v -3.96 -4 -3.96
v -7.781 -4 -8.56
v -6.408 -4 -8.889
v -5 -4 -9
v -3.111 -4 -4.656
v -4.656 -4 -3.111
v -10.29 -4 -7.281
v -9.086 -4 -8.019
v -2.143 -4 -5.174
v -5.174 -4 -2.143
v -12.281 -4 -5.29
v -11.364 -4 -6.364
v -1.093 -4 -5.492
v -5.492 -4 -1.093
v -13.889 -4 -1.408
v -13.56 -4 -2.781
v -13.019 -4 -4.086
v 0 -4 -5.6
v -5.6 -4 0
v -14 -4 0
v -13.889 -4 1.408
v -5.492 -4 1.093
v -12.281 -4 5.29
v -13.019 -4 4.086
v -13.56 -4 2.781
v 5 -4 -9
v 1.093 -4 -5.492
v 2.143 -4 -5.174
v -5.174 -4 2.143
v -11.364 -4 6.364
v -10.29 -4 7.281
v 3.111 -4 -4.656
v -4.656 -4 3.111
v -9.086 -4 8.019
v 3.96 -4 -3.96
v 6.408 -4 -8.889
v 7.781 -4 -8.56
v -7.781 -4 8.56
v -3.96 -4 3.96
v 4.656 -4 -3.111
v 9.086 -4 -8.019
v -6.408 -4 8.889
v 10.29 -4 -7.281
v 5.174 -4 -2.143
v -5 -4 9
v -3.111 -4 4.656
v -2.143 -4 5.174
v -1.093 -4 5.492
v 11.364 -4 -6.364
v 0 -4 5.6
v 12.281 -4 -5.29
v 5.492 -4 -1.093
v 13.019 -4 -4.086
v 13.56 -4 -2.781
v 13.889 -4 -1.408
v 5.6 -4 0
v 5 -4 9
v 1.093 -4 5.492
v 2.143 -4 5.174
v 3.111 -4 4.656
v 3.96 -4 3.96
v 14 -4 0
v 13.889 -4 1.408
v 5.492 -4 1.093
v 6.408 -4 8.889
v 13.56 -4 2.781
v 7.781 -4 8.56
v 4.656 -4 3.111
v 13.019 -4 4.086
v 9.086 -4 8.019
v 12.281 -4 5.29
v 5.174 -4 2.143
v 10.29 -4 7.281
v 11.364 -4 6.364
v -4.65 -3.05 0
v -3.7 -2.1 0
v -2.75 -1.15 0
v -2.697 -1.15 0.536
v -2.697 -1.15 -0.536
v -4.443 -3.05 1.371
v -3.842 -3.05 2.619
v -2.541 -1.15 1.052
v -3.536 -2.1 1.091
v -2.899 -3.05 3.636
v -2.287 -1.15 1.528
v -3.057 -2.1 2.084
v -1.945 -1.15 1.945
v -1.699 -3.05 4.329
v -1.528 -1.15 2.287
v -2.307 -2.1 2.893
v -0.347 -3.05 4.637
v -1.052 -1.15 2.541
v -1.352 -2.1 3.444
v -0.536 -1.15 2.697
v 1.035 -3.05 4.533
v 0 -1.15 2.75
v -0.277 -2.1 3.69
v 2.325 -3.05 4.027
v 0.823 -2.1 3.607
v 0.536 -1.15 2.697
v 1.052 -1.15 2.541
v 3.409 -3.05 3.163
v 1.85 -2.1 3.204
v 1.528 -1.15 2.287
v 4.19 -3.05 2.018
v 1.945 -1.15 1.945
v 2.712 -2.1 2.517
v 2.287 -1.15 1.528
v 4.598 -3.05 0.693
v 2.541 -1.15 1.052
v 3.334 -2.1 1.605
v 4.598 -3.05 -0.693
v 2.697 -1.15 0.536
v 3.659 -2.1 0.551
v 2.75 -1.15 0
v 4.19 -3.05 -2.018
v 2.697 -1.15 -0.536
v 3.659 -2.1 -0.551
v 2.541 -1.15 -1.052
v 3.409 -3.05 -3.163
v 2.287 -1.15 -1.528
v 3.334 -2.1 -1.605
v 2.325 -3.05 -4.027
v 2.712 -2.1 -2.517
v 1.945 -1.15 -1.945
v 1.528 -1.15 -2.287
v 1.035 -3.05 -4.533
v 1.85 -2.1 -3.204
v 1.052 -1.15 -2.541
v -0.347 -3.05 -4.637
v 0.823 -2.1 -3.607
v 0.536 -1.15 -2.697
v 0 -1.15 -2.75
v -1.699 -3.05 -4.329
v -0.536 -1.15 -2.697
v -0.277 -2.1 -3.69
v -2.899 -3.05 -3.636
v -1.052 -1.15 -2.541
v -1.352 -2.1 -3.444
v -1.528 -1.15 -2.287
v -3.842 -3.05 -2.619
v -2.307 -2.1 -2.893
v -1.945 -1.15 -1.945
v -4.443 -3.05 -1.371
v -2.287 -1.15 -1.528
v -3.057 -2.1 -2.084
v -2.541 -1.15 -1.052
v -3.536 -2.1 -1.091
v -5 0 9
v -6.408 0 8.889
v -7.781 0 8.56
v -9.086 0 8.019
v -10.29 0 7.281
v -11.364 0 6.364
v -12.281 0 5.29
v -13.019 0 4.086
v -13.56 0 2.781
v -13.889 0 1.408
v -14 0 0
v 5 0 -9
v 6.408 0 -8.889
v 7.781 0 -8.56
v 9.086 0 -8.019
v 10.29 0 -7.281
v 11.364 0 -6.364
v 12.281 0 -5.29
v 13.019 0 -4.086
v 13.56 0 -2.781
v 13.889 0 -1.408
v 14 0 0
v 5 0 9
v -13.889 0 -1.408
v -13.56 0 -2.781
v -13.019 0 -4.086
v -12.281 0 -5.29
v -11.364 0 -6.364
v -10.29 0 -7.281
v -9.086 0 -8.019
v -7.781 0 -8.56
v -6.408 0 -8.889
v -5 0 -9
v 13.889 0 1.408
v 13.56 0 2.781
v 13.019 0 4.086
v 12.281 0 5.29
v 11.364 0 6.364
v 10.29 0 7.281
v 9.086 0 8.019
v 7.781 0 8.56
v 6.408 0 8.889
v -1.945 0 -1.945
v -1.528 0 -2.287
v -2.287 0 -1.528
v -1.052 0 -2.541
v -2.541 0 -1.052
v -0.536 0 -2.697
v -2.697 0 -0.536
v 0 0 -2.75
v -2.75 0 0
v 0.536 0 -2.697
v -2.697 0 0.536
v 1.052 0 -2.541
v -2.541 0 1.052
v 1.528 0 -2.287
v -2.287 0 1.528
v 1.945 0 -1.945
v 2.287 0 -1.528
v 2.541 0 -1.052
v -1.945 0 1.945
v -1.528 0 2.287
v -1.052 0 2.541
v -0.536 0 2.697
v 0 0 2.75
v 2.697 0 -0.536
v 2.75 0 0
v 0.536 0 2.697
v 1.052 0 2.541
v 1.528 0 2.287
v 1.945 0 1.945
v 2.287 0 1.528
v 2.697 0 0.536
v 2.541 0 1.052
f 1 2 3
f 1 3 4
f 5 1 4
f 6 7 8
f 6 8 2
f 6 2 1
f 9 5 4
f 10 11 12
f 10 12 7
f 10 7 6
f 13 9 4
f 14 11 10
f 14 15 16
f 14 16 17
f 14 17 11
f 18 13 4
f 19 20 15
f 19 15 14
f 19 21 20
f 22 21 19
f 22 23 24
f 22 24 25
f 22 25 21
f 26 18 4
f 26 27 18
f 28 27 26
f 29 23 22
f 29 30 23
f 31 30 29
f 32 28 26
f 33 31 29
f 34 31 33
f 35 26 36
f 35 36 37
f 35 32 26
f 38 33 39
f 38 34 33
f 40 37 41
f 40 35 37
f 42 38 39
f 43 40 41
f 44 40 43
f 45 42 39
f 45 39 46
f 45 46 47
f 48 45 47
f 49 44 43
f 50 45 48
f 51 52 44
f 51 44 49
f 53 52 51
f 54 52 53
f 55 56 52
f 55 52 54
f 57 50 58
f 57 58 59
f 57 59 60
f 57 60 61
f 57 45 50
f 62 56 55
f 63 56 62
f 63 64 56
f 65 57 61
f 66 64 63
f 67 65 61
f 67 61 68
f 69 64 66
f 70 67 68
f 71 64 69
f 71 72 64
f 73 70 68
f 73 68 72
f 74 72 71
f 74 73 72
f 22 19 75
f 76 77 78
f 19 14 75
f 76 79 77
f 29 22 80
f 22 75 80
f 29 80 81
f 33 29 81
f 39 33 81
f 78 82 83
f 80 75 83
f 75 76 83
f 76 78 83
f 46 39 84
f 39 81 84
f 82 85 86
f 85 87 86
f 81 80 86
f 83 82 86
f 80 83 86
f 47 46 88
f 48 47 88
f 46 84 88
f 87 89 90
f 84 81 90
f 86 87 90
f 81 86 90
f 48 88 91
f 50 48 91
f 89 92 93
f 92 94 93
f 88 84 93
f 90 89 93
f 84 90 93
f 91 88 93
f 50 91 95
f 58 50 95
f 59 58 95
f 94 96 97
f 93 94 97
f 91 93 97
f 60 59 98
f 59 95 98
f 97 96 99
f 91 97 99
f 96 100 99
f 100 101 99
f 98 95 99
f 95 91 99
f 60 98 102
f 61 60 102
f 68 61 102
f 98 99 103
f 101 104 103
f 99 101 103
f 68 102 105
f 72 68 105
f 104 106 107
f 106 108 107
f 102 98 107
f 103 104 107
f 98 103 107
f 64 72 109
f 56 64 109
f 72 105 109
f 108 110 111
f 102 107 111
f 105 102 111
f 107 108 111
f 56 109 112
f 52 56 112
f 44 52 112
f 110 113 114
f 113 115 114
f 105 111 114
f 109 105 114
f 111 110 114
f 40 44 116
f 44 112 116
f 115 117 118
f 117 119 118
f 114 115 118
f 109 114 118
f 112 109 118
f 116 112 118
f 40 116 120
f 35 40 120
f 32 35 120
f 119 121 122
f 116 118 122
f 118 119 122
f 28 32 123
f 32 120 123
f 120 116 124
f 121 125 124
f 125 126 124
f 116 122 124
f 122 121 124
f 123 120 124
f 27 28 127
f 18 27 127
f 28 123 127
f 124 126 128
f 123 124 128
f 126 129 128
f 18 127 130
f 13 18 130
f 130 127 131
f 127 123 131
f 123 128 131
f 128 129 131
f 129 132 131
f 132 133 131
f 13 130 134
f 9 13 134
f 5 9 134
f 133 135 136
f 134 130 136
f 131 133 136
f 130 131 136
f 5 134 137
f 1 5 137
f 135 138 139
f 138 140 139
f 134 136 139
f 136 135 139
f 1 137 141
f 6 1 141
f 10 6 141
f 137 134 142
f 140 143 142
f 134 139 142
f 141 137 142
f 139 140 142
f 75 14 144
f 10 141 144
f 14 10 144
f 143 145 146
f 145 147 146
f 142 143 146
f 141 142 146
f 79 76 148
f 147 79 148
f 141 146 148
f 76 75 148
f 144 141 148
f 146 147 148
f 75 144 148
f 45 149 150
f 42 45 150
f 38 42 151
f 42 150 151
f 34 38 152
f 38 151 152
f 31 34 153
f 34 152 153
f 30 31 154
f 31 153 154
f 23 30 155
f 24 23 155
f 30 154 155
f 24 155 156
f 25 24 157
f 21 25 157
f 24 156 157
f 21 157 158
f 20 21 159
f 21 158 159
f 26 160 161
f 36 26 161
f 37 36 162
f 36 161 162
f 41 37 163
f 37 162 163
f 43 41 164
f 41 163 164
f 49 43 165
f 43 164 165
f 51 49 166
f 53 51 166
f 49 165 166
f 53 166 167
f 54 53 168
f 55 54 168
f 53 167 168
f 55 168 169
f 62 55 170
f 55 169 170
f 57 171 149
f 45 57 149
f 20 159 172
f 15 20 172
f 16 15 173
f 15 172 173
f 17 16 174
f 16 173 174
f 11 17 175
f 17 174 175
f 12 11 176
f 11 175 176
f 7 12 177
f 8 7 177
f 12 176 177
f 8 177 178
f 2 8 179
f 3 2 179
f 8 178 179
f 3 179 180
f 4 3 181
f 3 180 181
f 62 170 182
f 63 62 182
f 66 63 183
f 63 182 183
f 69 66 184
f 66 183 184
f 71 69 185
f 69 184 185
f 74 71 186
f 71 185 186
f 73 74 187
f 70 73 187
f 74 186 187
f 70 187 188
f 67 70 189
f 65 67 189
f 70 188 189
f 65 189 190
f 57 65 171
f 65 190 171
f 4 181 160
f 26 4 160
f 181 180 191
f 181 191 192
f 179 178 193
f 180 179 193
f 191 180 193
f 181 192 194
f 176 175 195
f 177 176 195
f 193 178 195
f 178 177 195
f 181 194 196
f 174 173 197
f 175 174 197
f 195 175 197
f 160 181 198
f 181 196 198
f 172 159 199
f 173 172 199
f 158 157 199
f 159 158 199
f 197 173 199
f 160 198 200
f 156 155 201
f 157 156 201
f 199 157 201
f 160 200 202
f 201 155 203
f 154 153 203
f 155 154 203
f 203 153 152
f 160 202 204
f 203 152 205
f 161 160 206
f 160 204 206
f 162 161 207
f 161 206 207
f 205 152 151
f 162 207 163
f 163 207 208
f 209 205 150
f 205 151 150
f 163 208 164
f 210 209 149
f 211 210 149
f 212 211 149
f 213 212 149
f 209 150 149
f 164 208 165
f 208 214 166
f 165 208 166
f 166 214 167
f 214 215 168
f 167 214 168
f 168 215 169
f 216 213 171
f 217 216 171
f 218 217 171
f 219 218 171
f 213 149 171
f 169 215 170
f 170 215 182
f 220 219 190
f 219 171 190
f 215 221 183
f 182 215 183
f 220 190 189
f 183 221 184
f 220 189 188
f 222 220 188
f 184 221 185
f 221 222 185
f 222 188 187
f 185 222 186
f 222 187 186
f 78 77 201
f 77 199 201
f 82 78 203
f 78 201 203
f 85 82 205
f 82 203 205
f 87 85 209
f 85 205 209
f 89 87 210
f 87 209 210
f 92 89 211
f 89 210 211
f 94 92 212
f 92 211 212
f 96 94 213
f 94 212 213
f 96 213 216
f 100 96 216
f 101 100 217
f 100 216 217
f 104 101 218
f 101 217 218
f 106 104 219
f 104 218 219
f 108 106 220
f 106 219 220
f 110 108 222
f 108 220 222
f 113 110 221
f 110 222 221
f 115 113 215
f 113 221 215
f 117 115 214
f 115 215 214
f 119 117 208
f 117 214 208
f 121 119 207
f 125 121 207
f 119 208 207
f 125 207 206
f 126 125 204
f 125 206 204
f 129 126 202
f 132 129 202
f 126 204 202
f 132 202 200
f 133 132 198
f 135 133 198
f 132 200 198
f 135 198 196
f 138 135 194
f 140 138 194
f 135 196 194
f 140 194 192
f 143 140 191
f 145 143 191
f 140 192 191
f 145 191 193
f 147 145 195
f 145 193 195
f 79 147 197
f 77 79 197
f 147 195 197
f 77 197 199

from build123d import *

# Parameters (mm, degrees)
F1_DEPTH       = 4
F3_D           = 5.5
F3_CSINK_D     = 11.2
F3_CSINK_ANGLE = 90


with BuildPart() as f1:
    # F0 (on Front) → F1 (new body)
    with BuildSketch(Plane.XZ):
        with BuildLine():
            ThreePointArc((-14, 0), (-11.3639610307, -6.3639610307), (-5, -9))
            Line((-5, -9), (5, -9))
            ThreePointArc((5, -9), (11.3639610307, -6.3639610307), (14, 0))
            ThreePointArc((14, 0), (11.3639610307, 6.3639610307), (5, 9))
            Line((5, 9), (-5, 9))
            ThreePointArc((-5, 9), (-11.3639610307, 6.3639610307), (-14, 0))
        make_face()
    extrude(amount=F1_DEPTH)

    # F3 (through all)
    with Locations(Plane.XZ.offset(4)):
        with Locations((0, 0)):
            CounterSinkHole(F3_D / 2, F3_CSINK_D / 2, counter_sink_angle=F3_CSINK_ANGLE)


solid = f1.part
